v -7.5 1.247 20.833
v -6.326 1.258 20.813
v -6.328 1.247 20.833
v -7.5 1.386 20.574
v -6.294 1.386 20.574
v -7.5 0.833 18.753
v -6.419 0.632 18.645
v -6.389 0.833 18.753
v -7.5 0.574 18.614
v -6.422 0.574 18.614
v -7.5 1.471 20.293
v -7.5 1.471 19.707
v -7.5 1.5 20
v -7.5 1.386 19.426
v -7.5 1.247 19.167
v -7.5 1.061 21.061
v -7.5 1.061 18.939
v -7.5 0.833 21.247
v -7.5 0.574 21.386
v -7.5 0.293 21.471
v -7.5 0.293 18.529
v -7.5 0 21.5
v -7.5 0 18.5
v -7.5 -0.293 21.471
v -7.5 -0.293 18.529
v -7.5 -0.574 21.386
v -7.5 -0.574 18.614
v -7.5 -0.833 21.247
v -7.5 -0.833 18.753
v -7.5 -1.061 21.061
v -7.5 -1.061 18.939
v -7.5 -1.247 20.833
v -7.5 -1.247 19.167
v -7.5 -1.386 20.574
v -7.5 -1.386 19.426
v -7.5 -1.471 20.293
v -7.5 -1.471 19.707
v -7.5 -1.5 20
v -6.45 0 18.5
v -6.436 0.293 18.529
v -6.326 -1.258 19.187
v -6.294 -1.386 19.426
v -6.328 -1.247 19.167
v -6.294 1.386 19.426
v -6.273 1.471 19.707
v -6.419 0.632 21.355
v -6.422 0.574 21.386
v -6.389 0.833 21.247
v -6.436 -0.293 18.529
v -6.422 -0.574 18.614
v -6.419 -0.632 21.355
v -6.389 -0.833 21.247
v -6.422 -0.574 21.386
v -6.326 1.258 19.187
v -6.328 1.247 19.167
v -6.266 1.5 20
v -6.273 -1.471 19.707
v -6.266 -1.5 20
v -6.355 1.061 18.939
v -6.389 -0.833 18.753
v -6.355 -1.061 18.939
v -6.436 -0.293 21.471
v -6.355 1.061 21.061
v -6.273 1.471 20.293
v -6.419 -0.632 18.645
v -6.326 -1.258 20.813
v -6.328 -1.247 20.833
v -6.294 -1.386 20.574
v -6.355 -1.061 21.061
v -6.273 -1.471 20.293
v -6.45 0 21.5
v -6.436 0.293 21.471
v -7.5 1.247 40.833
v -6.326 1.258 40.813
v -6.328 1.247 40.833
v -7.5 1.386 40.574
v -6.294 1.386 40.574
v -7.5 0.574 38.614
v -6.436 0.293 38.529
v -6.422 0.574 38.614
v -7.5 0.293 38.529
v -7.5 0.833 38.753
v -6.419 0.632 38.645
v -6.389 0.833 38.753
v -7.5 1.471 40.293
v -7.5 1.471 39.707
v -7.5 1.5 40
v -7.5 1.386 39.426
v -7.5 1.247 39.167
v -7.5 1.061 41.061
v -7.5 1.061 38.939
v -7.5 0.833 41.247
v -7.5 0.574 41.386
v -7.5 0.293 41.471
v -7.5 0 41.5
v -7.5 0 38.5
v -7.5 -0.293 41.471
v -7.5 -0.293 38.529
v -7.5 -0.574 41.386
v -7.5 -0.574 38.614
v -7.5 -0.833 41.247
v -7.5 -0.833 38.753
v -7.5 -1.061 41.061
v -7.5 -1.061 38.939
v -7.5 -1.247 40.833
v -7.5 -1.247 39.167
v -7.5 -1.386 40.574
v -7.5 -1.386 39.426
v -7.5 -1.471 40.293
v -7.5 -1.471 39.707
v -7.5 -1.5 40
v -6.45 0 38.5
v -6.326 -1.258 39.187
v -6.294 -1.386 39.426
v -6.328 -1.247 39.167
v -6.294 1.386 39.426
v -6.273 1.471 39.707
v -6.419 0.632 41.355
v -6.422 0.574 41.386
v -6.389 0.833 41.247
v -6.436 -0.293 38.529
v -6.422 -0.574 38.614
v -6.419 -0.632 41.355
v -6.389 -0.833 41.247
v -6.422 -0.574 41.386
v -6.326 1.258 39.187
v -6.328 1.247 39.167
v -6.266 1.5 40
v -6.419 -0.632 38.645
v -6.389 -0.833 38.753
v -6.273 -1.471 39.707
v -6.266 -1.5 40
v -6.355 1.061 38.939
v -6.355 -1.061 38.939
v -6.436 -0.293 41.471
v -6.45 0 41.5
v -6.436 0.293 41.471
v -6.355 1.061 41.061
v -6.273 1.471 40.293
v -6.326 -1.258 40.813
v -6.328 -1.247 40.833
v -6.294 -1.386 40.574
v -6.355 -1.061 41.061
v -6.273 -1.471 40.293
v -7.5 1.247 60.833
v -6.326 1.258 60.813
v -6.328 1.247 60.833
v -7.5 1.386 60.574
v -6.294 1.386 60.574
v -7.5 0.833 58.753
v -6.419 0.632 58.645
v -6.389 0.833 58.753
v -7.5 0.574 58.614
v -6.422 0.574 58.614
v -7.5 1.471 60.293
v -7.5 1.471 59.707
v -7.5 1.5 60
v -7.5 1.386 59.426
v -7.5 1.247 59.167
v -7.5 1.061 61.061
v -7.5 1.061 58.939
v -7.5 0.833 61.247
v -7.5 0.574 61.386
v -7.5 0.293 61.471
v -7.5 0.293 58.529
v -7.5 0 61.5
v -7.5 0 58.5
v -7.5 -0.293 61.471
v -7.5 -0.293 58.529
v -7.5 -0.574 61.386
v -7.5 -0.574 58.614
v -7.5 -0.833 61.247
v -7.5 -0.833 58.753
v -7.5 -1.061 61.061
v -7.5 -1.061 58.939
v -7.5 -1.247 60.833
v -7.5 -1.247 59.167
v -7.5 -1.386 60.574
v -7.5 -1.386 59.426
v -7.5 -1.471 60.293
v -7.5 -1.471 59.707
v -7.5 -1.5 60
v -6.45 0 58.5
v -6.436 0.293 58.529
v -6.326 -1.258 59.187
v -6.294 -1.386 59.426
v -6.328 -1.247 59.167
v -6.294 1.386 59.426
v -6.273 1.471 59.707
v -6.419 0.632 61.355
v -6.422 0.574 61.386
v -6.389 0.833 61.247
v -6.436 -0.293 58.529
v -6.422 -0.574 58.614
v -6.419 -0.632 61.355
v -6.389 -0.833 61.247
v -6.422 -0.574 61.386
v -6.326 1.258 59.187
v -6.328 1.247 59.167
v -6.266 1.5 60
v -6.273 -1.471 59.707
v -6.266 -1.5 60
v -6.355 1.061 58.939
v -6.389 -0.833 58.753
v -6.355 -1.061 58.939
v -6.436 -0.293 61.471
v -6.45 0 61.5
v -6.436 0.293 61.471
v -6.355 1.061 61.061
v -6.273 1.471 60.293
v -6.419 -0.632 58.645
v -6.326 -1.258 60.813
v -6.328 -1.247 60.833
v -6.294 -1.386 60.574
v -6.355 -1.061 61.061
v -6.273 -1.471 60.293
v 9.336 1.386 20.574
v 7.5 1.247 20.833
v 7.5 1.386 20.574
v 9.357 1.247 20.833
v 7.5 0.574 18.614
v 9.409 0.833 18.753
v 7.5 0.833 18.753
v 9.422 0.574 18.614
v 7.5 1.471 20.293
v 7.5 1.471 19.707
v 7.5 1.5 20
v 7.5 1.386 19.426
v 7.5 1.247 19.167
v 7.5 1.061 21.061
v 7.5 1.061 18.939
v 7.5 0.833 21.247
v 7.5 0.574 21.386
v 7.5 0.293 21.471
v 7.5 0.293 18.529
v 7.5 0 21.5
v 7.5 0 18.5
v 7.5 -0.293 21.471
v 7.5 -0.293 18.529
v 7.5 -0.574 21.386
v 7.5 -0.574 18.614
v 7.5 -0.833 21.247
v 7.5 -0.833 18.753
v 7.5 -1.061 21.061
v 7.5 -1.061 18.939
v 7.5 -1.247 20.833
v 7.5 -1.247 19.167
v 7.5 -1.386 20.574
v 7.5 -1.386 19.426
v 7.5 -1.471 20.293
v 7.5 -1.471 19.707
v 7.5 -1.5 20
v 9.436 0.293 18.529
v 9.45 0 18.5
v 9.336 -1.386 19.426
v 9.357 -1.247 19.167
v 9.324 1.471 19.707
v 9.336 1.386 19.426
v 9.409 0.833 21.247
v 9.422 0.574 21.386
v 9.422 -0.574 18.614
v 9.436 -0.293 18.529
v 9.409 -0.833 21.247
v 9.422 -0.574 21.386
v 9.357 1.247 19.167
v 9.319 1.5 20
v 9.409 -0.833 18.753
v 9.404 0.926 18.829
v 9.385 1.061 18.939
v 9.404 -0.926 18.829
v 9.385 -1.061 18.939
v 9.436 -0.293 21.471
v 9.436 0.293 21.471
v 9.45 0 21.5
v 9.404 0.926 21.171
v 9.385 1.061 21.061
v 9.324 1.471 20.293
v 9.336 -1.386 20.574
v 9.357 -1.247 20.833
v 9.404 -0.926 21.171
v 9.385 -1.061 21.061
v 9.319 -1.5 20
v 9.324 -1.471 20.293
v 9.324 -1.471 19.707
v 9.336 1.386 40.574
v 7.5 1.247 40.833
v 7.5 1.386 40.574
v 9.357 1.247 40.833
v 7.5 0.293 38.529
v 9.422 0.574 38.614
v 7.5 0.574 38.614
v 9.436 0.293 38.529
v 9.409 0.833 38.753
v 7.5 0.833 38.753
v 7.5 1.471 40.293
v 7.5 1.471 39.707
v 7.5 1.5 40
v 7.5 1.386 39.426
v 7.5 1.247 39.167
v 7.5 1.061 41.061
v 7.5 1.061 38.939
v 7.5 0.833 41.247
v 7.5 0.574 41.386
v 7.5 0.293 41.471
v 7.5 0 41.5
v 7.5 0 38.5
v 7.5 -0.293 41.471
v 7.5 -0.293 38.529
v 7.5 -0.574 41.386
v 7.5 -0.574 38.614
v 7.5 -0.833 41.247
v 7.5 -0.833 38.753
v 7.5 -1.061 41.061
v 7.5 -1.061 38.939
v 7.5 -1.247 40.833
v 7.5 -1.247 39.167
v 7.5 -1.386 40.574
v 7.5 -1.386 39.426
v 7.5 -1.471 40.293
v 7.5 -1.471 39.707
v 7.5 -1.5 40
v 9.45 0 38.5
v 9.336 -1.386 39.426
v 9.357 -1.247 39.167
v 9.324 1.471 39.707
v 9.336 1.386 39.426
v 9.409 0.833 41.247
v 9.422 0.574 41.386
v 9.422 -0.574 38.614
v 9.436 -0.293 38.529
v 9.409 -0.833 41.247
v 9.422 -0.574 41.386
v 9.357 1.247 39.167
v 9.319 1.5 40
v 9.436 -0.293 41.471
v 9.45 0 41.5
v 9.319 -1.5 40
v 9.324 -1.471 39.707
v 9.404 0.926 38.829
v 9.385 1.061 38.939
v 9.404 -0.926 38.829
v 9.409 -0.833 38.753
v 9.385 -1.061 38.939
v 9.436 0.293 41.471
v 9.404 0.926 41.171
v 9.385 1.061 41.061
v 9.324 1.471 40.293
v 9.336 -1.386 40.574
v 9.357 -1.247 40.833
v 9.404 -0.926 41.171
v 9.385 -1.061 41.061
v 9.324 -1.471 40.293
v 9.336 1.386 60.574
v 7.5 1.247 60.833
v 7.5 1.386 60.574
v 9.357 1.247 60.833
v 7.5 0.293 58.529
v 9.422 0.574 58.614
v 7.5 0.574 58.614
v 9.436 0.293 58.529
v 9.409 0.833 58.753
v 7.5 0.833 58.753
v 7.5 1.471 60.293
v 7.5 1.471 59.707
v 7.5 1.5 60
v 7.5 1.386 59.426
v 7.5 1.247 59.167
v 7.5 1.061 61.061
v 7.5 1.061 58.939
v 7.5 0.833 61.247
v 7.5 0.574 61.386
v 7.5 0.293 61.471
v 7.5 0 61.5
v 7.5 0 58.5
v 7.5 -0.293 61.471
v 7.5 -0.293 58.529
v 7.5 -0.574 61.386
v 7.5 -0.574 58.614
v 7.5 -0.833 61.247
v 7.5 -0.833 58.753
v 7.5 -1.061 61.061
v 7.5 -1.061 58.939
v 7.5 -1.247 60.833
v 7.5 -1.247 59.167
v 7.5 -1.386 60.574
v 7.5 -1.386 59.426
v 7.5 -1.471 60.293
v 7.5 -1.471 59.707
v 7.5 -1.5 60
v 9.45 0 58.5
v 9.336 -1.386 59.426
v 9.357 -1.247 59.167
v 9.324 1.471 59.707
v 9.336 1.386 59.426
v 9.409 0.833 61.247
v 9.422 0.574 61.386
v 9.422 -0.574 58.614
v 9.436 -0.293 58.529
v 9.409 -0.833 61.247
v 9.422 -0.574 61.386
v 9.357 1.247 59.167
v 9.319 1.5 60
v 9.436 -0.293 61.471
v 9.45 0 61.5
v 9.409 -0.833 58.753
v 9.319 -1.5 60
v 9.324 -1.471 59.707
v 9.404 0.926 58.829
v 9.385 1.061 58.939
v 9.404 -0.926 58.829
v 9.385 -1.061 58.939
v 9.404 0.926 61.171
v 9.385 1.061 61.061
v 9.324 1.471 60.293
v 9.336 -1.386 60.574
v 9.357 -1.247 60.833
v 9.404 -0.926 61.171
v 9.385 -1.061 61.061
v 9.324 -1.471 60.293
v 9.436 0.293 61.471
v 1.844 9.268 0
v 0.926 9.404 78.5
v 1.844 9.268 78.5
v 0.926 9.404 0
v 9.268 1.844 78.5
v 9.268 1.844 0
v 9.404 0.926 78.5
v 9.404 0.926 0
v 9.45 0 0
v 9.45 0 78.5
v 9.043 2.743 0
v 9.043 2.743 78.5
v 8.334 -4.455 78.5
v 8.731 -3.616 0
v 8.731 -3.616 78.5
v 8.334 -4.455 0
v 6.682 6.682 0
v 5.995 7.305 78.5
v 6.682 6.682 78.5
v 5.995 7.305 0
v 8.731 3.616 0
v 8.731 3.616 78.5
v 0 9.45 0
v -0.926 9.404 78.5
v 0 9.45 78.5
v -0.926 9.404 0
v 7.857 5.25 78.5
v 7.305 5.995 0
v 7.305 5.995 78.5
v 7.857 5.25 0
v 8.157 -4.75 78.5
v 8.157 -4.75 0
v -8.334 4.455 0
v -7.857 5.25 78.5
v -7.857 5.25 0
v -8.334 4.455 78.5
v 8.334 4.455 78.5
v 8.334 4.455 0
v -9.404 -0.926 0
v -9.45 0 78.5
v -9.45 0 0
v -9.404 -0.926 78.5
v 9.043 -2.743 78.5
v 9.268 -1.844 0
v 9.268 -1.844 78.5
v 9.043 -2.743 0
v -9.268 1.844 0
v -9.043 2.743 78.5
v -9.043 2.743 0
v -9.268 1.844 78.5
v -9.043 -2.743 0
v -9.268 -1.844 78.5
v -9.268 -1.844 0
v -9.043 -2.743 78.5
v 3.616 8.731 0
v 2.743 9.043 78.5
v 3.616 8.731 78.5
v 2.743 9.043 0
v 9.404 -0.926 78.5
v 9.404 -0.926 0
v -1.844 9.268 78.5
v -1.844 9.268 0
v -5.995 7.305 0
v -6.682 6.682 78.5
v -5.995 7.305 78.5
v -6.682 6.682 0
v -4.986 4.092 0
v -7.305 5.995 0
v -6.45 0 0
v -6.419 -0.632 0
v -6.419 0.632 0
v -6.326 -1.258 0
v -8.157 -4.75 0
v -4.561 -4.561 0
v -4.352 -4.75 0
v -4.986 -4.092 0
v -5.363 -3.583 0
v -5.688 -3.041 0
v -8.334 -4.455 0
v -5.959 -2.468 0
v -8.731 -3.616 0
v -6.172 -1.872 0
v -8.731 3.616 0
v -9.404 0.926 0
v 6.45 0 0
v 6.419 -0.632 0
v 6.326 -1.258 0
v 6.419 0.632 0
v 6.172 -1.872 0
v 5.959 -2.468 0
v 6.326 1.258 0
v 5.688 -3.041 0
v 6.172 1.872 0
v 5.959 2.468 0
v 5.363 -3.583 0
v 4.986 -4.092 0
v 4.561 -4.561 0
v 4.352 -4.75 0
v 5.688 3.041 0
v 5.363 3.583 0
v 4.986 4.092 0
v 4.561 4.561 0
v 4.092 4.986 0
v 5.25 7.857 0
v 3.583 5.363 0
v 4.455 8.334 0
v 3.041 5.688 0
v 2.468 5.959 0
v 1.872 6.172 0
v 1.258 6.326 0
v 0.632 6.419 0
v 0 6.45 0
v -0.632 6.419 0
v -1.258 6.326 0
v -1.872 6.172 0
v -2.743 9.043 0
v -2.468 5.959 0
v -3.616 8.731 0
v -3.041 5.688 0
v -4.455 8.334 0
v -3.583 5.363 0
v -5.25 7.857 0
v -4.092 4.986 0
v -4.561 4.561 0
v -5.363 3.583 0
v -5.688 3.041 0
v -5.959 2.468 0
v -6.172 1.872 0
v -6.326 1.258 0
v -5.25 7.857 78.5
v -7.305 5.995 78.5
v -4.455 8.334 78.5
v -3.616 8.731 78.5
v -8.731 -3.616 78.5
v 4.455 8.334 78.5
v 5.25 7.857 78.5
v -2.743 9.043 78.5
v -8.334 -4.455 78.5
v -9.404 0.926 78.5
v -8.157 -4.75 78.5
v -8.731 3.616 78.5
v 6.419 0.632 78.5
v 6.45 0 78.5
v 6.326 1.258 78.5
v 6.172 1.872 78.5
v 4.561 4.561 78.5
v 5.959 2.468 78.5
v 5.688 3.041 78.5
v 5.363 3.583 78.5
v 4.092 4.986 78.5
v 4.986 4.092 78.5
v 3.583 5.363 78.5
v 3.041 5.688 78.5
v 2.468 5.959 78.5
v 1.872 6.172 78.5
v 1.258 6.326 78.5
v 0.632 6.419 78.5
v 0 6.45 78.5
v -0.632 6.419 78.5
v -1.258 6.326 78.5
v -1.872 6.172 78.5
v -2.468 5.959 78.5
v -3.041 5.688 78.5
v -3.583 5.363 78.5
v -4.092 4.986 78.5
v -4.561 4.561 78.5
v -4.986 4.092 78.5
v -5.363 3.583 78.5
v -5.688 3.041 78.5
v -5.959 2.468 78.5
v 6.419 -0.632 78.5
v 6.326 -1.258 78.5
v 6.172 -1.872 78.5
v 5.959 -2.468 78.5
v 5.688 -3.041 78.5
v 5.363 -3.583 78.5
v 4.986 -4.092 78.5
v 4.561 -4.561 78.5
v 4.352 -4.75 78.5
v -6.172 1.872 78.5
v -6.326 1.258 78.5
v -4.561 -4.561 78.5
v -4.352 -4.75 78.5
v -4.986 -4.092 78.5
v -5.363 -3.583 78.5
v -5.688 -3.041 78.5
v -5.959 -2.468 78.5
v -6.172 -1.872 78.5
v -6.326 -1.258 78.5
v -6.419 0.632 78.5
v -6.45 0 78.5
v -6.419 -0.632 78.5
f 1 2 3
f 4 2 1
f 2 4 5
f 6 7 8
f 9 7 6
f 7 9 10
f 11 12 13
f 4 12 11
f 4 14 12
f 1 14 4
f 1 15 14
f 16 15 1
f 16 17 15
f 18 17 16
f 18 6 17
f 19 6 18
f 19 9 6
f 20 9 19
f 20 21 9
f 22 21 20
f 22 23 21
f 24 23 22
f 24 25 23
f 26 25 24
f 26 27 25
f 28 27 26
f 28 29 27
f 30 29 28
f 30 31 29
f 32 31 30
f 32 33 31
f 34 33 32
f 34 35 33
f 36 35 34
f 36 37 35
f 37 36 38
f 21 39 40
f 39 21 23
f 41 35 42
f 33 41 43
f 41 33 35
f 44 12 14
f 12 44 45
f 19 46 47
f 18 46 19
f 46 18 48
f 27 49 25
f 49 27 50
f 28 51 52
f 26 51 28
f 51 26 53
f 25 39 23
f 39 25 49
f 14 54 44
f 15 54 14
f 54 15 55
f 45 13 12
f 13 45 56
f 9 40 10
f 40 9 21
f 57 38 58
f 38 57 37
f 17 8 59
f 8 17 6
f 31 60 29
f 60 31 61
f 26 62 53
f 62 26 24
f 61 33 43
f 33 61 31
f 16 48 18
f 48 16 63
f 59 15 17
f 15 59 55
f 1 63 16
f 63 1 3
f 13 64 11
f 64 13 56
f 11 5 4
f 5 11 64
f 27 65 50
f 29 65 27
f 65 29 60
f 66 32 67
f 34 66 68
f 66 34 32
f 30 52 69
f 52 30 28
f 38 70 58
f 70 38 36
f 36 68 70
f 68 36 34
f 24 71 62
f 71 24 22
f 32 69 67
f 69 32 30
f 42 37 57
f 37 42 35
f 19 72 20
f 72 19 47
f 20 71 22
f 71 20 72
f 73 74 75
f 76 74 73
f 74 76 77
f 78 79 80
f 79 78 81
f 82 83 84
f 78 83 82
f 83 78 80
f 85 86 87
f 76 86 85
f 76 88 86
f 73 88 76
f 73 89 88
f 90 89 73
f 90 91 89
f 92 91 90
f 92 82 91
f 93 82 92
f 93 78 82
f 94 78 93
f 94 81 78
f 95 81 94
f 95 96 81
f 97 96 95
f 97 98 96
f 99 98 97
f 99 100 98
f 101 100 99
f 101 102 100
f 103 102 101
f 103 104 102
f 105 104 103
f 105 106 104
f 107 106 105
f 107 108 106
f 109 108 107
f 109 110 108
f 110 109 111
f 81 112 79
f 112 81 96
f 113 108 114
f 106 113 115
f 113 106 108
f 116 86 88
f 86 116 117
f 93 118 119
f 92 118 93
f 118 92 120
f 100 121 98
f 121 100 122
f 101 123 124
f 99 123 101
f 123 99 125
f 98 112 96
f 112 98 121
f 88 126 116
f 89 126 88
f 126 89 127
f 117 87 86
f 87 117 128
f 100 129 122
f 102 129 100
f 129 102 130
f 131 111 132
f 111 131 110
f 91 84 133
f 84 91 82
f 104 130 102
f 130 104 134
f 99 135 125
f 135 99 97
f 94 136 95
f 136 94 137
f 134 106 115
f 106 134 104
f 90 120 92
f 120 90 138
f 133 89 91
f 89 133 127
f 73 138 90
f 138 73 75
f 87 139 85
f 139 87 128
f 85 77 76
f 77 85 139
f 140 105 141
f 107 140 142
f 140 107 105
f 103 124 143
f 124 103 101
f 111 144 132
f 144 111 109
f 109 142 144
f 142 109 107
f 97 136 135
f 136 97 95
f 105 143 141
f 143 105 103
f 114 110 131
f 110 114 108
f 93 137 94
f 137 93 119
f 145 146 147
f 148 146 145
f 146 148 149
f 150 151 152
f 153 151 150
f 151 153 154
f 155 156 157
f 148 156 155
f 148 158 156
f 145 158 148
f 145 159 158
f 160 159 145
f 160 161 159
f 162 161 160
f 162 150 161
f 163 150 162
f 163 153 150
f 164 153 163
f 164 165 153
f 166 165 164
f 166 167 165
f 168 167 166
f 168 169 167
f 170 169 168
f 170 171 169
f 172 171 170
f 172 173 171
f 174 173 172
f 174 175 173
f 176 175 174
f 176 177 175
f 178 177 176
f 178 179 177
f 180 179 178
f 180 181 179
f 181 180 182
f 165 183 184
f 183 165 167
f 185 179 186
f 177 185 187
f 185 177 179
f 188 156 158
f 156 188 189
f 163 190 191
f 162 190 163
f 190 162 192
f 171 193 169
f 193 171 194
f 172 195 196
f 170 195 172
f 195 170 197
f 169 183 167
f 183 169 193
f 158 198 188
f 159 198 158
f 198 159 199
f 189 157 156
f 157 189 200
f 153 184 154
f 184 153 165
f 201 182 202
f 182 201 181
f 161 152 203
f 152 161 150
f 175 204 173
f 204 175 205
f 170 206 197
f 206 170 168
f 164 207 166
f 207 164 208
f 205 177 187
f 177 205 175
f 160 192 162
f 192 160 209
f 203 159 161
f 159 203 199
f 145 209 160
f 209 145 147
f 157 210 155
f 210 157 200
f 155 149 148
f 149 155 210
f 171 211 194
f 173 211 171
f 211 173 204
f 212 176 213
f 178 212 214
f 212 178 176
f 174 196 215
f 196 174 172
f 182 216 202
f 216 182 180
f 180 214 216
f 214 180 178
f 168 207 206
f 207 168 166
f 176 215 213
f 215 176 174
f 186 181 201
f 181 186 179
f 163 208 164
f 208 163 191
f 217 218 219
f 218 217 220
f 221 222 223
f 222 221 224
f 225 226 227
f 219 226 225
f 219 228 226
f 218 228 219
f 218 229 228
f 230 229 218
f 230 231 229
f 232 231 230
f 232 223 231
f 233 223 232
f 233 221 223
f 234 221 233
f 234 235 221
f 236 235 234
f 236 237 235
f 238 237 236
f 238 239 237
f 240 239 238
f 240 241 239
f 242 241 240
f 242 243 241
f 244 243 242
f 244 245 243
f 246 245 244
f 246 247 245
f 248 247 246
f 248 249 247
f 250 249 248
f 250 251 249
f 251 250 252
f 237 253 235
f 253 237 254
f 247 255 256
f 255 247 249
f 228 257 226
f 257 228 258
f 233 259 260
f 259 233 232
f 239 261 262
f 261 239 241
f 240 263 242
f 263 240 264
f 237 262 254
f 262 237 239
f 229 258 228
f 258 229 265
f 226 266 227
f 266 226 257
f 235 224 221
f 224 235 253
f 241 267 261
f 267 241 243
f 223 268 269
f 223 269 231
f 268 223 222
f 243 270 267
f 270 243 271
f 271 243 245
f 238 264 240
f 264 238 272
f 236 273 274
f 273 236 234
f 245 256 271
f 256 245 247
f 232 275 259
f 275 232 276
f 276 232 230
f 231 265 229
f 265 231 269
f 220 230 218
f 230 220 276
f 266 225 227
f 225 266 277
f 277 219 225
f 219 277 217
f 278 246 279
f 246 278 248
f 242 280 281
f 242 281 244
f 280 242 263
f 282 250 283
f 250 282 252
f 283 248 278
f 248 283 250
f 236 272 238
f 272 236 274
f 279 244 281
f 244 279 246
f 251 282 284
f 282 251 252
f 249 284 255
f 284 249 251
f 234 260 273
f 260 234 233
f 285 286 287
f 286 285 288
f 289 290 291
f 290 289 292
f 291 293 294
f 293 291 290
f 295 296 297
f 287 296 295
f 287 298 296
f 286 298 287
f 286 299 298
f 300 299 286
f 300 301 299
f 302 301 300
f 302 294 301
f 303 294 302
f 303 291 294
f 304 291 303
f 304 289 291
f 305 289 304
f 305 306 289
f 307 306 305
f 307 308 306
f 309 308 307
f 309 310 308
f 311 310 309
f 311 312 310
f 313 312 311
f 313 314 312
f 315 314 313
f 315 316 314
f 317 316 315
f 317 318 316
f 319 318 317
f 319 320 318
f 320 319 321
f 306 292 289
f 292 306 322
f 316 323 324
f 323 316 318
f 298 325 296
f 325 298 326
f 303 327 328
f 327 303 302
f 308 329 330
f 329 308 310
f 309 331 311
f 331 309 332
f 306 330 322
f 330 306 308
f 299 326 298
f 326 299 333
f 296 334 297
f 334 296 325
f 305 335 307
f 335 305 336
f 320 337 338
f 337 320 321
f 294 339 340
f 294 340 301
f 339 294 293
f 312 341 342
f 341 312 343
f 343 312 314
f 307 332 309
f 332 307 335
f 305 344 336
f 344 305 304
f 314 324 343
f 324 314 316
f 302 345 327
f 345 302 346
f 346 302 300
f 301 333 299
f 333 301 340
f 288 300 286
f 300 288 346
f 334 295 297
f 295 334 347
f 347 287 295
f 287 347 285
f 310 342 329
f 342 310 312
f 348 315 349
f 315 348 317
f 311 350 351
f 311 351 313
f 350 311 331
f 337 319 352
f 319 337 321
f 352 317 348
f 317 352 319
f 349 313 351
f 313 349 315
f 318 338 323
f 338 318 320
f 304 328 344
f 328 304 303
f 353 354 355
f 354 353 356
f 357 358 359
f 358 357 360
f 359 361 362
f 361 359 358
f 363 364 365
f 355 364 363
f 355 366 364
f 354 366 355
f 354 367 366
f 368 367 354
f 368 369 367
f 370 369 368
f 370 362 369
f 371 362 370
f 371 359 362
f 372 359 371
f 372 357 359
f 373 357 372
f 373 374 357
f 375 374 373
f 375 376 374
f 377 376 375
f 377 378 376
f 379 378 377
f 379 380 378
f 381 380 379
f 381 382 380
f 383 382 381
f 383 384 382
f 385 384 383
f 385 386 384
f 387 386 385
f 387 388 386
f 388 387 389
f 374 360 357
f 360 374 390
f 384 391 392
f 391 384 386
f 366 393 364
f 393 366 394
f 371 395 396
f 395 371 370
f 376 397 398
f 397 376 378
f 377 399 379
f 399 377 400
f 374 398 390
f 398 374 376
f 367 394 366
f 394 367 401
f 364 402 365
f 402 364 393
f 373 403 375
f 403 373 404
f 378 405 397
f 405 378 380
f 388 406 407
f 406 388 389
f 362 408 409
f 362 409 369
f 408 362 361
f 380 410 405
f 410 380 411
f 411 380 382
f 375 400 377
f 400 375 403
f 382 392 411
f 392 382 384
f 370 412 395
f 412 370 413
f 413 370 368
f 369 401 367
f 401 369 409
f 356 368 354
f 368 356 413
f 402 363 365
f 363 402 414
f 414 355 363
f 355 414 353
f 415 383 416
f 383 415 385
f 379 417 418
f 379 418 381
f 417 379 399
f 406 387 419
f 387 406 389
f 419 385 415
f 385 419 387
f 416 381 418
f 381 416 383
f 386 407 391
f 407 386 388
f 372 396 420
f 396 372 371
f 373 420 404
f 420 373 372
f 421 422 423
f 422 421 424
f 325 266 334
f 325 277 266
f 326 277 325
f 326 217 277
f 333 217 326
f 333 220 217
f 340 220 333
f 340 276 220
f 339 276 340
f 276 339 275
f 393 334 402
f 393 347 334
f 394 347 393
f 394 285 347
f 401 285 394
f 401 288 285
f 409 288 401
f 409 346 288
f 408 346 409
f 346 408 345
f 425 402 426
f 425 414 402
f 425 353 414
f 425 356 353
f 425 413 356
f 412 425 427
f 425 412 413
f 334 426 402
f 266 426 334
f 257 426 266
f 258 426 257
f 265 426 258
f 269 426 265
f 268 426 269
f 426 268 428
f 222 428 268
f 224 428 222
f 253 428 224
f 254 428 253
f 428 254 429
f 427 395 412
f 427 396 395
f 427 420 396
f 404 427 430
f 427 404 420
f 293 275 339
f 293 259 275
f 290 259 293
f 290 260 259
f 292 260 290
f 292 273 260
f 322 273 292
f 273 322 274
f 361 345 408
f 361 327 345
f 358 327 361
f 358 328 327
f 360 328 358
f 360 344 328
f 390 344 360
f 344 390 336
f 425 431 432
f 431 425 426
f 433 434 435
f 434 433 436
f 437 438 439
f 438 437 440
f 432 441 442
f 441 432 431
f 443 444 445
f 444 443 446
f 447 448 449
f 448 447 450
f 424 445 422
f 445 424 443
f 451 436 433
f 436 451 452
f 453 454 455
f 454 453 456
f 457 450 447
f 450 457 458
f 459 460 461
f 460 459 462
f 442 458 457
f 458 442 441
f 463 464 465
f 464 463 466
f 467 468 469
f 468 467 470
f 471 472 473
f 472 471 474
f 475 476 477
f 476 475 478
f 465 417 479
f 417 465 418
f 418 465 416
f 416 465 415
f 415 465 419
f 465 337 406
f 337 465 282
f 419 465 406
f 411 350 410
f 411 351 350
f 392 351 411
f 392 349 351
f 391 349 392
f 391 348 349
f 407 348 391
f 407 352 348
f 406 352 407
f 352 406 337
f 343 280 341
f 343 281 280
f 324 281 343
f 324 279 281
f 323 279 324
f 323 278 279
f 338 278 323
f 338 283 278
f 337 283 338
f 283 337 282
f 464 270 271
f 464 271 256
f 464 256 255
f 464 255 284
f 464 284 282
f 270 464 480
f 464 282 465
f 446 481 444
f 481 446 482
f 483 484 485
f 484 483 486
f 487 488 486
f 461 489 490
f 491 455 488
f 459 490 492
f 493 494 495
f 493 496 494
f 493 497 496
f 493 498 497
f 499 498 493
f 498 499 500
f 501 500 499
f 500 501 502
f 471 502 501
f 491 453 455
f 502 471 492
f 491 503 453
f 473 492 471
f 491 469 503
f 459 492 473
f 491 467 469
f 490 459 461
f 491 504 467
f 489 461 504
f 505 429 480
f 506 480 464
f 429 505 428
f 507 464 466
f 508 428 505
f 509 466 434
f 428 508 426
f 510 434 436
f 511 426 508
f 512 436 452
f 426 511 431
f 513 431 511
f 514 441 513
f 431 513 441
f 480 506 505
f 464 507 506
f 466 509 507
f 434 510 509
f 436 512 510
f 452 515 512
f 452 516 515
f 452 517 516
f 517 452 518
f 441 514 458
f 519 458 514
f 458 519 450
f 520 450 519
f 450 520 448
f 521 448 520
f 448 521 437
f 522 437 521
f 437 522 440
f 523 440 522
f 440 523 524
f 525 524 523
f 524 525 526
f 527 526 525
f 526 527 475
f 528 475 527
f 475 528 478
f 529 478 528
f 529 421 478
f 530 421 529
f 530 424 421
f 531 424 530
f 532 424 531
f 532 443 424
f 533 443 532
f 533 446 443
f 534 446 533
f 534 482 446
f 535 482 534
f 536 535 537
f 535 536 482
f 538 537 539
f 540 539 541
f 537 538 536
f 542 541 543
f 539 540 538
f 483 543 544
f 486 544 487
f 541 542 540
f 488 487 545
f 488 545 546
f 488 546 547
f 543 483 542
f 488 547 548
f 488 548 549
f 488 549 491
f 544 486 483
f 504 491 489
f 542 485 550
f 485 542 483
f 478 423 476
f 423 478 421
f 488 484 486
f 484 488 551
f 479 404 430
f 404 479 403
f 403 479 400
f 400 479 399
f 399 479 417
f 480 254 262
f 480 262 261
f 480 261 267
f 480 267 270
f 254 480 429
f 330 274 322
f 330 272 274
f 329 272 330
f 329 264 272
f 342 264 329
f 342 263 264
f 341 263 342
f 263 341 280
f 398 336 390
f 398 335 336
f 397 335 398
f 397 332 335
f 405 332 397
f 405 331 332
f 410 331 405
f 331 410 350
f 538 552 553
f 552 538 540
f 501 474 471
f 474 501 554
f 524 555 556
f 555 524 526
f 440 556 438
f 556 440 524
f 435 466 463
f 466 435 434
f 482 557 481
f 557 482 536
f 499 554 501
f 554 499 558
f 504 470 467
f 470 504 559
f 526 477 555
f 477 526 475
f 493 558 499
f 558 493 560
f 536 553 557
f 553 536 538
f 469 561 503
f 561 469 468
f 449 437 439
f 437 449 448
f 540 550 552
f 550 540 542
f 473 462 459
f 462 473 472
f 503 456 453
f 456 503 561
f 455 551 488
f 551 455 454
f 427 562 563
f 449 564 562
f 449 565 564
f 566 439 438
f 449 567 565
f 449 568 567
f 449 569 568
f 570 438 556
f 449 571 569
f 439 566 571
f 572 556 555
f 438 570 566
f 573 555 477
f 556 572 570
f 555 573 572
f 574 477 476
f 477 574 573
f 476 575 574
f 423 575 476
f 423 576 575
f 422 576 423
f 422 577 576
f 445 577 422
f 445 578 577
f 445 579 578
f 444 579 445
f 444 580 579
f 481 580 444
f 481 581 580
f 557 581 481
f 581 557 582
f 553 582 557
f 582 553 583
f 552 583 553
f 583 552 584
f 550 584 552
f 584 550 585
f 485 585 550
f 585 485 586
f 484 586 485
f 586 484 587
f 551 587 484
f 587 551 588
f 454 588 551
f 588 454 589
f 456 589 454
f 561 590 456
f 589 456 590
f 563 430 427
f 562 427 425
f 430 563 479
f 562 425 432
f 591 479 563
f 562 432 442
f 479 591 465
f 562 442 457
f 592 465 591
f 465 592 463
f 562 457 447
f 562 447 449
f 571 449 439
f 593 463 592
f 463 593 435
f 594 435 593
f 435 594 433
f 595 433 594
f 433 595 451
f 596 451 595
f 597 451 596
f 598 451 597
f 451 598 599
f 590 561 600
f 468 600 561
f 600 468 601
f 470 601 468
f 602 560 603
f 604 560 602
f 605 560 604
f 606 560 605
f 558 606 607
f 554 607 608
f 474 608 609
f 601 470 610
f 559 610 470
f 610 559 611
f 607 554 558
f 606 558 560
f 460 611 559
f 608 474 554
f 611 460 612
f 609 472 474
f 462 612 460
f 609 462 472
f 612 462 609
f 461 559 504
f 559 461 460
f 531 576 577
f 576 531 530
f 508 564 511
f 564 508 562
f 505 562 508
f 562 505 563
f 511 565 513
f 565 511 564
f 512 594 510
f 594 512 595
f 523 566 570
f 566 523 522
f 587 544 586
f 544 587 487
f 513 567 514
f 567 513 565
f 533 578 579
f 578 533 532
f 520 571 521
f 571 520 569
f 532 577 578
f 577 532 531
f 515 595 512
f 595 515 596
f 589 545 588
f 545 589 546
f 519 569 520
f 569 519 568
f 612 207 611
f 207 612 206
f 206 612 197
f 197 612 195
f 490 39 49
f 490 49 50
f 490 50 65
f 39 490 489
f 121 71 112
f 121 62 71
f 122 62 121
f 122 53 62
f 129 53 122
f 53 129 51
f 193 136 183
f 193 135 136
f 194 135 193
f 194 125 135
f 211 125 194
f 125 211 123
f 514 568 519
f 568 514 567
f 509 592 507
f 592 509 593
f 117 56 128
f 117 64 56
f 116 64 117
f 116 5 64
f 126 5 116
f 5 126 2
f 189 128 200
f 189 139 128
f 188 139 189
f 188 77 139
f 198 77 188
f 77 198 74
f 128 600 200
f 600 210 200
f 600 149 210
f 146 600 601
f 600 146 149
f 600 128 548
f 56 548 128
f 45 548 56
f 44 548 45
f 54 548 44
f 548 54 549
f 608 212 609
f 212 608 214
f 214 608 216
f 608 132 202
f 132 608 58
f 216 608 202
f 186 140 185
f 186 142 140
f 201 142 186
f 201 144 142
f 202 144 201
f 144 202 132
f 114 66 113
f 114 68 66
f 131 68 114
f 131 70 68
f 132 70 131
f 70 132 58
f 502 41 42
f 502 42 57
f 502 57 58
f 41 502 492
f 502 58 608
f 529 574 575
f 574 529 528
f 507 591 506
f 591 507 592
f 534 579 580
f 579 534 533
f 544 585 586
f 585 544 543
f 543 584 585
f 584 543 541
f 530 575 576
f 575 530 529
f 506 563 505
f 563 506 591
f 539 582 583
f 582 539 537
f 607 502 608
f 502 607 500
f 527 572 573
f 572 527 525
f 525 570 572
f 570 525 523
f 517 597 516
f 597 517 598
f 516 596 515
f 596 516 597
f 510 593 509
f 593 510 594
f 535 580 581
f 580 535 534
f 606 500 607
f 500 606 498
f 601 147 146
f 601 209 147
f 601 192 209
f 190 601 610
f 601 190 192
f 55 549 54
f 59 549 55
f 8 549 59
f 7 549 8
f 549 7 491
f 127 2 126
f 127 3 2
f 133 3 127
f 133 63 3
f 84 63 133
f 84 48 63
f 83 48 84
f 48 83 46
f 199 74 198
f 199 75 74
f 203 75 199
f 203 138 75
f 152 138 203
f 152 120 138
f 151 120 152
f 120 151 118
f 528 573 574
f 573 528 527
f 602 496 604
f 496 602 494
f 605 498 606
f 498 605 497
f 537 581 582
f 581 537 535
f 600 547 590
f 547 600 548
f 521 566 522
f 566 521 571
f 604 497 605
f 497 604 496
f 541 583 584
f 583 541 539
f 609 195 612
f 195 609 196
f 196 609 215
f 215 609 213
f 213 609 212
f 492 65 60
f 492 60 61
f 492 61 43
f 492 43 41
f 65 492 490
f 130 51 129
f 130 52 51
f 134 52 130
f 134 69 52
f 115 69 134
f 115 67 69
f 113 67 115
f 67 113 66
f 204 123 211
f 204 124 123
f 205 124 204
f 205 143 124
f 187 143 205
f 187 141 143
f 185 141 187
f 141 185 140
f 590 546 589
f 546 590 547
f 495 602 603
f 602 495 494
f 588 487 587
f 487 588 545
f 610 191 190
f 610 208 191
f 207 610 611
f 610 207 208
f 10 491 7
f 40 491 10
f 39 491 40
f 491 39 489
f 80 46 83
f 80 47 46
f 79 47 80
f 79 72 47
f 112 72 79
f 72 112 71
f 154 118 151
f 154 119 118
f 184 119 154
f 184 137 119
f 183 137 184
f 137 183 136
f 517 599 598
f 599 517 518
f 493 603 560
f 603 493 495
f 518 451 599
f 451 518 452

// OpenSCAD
module split_cylindrical_sleeve() {
    difference() {
        // Main cylinder
        cylinder(h=78.5, r=9.45, $fn=64);
        
        // Inner bore
        translate([0, 0, -1])
            cylinder(h=80.5, r=6.45, $fn=64);
        
        // Axial slit
        translate([-9.75, -9.75, -1])
            cube([19.5, 5, 80.5]);
        
        // Internal relief notches
        for (i = [-1, 1]) {
            translate([i * 7.5, 0, 20])
                rotate([0, 90, 0])
                    cylinder(h=5, r=1.5, $fn=32);
            translate([i * 7.5, 0, 40])
                rotate([0, 90, 0])
                    cylinder(h=5, r=1.5, $fn=32);
            translate([i * 7.5, 0, 60])
                rotate([0, 90, 0])
                    cylinder(h=5, r=1.5, $fn=32);
        }
    }
}

split_cylindrical_sleeve();
